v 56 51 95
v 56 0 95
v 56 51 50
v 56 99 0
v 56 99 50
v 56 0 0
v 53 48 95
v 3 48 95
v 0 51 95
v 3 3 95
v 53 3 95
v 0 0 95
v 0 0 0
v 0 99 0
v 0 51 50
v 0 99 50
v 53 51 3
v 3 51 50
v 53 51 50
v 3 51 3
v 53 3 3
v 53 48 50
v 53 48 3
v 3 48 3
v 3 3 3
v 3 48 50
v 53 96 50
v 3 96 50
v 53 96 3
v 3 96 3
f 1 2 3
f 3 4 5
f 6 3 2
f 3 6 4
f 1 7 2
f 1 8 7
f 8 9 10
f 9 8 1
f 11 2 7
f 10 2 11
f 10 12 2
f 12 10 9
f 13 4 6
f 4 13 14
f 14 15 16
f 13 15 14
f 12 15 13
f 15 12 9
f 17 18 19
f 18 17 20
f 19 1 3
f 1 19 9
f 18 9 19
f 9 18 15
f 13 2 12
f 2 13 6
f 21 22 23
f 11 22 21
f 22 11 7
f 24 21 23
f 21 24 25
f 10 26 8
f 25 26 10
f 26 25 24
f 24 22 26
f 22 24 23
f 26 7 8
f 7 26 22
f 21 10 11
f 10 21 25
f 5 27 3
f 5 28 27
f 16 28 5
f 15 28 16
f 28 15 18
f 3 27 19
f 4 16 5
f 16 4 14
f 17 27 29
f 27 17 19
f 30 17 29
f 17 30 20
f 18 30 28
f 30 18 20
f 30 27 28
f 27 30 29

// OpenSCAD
union () {
    difference() {
        cube([56, 51, 95]);
        translate([3, 3, 3]) {
            cube([50, 45, 95]);
        }
    }
    translate([0, 48, 0]) {
        difference() {
            cube([56, 51, 50]);
            translate([3, 3, 3]) {
                cube([50, 45, 50]);
            }
        }
    }
}
